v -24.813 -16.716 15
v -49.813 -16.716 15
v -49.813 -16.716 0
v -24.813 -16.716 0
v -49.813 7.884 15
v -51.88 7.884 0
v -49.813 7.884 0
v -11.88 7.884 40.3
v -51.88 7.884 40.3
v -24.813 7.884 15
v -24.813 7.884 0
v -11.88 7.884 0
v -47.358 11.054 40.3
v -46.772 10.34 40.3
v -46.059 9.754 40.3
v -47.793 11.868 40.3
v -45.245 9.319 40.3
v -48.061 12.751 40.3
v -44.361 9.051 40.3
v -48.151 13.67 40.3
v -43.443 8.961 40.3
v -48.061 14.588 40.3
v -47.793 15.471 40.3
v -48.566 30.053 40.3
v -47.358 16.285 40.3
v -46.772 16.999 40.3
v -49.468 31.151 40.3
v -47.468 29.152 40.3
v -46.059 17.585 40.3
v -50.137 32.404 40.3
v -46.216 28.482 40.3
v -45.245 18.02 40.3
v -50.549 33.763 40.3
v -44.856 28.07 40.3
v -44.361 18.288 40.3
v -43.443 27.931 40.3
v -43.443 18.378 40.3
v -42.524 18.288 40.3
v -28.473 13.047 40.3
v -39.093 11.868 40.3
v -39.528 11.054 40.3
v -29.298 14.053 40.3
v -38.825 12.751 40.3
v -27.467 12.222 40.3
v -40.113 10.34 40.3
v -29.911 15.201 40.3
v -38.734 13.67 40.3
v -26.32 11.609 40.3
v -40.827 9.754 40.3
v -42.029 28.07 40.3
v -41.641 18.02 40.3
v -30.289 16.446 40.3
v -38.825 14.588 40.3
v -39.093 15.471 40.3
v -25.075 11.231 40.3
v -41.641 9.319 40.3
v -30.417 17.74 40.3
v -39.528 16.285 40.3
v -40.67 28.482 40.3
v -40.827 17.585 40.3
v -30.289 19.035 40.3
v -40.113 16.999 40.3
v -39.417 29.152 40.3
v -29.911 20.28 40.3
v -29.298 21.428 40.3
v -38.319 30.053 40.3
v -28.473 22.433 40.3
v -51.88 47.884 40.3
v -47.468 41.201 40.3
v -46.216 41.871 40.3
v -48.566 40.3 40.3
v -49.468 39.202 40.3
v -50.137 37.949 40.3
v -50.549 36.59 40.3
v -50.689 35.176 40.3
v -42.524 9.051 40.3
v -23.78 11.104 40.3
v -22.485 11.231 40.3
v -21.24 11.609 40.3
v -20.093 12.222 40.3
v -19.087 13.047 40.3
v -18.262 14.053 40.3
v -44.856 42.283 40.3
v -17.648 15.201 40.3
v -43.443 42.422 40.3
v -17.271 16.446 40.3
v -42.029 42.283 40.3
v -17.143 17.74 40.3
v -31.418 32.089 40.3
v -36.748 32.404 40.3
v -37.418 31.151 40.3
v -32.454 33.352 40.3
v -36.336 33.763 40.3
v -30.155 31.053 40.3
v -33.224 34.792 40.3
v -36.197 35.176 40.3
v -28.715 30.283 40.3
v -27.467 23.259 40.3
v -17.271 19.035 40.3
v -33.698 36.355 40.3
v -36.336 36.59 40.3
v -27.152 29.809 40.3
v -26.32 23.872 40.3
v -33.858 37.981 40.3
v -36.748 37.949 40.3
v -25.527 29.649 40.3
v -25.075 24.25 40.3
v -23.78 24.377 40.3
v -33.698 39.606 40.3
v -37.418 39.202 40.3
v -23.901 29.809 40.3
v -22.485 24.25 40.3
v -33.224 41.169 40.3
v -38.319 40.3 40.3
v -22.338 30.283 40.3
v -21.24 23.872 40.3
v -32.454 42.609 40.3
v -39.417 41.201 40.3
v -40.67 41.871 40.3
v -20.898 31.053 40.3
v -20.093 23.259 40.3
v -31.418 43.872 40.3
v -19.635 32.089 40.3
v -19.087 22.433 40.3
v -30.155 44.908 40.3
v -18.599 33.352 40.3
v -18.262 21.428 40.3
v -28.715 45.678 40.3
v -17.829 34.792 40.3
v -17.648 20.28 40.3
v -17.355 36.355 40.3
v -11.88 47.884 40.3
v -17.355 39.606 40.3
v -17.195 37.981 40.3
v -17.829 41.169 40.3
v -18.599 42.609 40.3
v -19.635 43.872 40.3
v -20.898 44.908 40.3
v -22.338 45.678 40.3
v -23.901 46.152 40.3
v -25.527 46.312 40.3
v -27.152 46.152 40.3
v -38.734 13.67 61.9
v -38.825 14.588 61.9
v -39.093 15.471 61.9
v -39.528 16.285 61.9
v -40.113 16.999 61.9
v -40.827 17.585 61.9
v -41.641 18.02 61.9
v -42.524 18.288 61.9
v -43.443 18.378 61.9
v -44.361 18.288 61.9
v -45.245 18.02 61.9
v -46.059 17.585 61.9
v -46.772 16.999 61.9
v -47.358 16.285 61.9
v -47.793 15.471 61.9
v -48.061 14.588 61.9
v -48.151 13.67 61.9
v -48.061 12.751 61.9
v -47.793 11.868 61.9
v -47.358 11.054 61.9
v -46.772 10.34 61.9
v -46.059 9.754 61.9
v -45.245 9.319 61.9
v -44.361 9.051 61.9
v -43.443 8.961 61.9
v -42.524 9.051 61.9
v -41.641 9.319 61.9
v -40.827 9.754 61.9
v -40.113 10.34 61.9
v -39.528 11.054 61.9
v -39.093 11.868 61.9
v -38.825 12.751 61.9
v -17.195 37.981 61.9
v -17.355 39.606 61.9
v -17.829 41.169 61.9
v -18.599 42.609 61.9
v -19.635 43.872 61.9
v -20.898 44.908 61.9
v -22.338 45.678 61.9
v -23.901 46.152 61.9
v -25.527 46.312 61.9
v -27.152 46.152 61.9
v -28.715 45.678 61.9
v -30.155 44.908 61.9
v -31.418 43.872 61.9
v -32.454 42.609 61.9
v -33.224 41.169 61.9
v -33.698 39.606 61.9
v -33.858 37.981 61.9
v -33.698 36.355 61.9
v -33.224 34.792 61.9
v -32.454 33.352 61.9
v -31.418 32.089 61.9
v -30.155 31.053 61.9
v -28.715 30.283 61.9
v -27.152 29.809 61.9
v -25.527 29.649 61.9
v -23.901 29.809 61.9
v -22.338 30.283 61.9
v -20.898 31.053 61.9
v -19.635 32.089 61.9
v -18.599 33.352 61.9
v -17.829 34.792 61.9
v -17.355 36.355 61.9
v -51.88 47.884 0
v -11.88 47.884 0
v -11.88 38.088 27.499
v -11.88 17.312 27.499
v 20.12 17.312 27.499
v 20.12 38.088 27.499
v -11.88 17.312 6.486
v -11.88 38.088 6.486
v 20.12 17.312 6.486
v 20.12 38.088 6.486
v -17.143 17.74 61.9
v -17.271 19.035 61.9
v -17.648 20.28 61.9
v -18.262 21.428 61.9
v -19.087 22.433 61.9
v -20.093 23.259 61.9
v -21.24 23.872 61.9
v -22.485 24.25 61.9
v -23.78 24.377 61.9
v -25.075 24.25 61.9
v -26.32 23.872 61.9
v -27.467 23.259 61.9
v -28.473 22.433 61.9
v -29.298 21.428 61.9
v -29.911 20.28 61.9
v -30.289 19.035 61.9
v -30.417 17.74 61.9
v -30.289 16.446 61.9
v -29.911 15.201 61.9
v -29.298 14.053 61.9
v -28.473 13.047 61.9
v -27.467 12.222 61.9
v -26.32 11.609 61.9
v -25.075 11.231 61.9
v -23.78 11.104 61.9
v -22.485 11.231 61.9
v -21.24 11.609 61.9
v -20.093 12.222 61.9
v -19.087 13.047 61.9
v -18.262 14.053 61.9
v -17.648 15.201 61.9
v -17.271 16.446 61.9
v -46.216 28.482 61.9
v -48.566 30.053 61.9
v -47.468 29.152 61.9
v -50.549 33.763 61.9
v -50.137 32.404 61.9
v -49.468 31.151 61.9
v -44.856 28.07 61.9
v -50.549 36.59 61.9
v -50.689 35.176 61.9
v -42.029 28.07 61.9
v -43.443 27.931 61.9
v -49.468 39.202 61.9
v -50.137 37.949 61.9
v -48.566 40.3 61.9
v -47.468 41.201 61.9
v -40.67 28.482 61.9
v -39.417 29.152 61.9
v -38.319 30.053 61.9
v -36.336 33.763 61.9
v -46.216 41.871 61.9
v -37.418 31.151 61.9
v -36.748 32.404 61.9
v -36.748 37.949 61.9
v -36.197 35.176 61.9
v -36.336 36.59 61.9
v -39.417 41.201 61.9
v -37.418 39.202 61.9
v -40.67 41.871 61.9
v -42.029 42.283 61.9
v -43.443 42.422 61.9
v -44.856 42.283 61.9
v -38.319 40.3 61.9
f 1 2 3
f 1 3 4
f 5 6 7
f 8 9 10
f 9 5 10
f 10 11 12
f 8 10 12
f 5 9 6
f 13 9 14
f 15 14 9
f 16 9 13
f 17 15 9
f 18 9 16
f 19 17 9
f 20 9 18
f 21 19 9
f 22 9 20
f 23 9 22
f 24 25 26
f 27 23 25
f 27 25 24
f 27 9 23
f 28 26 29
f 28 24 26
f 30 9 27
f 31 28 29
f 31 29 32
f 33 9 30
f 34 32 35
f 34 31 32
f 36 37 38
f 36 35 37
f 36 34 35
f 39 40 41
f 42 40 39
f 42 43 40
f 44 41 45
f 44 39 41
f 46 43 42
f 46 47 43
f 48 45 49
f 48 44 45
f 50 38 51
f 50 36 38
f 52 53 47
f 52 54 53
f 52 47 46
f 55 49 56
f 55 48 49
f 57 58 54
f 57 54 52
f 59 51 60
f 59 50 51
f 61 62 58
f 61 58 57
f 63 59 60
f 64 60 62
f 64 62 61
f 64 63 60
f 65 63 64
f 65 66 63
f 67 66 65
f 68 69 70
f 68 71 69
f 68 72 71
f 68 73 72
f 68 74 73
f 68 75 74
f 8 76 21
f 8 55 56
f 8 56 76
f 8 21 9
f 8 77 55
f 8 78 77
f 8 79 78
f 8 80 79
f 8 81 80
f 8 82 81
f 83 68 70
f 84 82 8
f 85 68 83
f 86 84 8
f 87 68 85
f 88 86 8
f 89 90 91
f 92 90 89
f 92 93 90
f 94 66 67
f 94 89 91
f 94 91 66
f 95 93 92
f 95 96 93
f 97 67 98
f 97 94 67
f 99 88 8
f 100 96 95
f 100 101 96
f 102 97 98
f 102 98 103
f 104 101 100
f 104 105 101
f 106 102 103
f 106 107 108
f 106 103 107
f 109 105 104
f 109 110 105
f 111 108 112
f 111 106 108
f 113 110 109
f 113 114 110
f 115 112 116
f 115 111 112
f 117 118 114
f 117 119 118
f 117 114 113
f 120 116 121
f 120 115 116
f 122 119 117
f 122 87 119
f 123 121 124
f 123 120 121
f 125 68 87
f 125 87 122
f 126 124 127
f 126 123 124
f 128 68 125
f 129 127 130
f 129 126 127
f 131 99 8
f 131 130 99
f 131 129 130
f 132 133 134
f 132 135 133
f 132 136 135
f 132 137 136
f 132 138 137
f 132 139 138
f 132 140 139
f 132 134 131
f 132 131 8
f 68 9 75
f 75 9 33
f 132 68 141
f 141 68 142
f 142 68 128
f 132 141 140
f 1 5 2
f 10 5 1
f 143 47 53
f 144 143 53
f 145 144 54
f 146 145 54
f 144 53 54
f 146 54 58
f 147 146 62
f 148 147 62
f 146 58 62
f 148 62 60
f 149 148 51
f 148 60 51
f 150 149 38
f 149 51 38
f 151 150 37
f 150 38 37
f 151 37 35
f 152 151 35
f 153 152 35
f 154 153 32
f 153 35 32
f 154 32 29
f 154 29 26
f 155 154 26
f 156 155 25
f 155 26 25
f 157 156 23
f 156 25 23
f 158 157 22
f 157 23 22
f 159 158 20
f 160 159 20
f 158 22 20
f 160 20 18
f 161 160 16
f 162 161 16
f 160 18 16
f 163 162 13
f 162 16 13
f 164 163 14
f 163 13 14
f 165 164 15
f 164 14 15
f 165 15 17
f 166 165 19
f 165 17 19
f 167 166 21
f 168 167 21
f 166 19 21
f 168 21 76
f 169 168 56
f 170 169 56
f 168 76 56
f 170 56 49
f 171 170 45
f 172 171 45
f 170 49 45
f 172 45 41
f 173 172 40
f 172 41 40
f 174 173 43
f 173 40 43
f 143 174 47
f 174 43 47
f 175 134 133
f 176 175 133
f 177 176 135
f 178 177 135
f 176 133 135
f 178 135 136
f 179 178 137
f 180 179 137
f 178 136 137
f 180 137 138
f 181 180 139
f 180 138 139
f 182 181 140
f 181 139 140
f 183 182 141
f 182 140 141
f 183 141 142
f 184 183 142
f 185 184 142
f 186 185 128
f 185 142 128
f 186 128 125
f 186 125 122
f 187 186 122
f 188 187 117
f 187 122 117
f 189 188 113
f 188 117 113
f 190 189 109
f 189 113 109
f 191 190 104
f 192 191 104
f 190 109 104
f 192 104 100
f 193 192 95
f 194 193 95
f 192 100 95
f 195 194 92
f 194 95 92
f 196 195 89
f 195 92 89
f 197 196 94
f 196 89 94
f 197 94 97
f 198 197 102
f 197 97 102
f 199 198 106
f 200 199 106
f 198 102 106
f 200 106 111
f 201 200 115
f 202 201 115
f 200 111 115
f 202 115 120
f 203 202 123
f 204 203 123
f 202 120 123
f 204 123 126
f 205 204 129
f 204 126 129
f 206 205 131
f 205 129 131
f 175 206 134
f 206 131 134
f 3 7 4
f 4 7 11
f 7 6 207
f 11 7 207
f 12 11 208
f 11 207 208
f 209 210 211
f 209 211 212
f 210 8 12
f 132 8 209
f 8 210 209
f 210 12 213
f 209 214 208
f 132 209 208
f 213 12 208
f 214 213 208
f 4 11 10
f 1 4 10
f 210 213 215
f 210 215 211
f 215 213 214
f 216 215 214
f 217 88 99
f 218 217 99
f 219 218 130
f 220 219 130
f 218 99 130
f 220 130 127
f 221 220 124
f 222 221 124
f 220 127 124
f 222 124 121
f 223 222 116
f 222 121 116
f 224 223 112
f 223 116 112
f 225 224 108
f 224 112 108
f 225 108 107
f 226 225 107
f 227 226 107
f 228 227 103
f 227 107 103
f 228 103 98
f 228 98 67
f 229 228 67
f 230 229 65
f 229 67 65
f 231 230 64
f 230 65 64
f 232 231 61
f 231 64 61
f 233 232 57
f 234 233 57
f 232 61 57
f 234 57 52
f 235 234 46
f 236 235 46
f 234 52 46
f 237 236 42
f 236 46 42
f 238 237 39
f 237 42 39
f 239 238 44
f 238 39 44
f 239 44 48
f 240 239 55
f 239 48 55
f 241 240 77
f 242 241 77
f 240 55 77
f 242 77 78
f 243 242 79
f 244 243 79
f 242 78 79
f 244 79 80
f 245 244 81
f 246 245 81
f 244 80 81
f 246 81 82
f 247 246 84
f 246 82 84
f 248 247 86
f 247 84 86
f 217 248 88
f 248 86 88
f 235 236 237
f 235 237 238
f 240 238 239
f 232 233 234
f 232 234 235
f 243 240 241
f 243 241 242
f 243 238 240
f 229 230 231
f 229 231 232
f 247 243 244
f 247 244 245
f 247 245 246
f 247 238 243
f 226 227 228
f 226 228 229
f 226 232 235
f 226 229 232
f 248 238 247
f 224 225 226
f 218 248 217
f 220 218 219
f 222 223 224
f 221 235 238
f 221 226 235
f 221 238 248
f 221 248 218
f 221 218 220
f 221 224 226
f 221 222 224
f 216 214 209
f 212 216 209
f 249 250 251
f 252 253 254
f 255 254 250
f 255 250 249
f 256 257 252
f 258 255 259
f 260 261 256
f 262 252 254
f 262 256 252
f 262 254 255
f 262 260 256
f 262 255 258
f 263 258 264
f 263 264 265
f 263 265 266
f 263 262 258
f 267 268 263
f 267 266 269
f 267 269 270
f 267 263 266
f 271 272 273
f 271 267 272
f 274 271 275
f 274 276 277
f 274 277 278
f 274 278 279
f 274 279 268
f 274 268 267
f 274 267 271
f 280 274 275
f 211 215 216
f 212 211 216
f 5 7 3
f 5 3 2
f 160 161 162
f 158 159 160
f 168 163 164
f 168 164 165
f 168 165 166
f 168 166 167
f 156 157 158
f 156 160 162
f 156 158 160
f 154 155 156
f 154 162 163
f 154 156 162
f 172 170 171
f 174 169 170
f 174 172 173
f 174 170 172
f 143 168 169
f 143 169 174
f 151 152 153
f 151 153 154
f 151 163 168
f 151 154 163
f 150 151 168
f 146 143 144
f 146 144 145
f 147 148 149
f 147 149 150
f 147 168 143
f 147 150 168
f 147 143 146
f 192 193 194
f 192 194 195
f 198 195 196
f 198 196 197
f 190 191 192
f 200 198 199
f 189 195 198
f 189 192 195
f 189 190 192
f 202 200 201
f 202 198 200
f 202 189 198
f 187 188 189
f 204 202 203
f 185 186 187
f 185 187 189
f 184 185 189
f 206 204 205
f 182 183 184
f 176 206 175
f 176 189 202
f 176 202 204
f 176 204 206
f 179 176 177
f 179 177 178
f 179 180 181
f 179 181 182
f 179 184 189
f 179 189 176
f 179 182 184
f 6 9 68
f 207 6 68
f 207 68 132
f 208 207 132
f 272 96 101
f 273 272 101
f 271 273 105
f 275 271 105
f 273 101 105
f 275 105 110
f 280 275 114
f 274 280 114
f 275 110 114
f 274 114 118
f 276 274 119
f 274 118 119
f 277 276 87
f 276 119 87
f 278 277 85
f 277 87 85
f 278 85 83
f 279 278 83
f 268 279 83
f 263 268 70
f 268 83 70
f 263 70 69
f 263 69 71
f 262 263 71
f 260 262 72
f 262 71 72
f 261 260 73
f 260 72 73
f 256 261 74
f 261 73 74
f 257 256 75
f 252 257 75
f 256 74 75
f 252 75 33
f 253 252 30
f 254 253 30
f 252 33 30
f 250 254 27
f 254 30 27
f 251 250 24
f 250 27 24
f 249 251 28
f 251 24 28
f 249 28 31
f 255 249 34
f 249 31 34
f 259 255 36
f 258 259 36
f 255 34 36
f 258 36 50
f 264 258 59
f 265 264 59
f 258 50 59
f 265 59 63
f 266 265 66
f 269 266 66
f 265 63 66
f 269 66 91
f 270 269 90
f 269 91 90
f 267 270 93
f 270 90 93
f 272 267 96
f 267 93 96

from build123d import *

# Parameters (mm, degrees)
F0_W     = 40
F0_H     = 40
F1_DEPTH = 40.3
F2_W     = 25
F2_H     = 15
F3_DEPTH = 24.6
F6_W     = 20.776337
F6_H     = 21.012508
F7_DEPTH = 32
F8_R     = 7.245927
F8_R_2   = 6.636752
F8_R_3   = 8.331711
F8_R_4   = 4.708623
F9_DEPTH = 21.6


with BuildPart() as f1:
    # F0 (on Top) → F1 (new body)
    with BuildSketch(Plane.XY):
        with Locations((-31.879965, 27.884198)):
            Rectangle(F0_W, F0_H)
    extrude(amount=F1_DEPTH)

    # F2 (on face) → F3 (join)
    with BuildSketch(Plane.XZ.offset(-7.884198)):
        with Locations((-37.312957, 7.5)):
            Rectangle(F2_W, F2_H)
    extrude(amount=F3_DEPTH)

    # F6 (on face) → F7 (join)
    with BuildSketch(Plane.YZ.offset(-11.879965)):
        with Locations((27.700019, 16.992602)):
            Rectangle(F6_W, F6_H)
    extrude(amount=F7_DEPTH)

    # F8 (on face) → F9 (join)
    with BuildSketch(Plane.XY.offset(40.3)):
        with Locations((-43.442782, 35.17646)):
            Circle(F8_R)
        with Locations((-23.779849, 17.740337)):
            Circle(F8_R_2)
        with Locations((-25.526628, 37.980523)):
            Circle(F8_R_3)
        with Locations((-43.442782, 13.669529)):
            Circle(F8_R_4)
    extrude(amount=F9_DEPTH)


solid = f1.part
